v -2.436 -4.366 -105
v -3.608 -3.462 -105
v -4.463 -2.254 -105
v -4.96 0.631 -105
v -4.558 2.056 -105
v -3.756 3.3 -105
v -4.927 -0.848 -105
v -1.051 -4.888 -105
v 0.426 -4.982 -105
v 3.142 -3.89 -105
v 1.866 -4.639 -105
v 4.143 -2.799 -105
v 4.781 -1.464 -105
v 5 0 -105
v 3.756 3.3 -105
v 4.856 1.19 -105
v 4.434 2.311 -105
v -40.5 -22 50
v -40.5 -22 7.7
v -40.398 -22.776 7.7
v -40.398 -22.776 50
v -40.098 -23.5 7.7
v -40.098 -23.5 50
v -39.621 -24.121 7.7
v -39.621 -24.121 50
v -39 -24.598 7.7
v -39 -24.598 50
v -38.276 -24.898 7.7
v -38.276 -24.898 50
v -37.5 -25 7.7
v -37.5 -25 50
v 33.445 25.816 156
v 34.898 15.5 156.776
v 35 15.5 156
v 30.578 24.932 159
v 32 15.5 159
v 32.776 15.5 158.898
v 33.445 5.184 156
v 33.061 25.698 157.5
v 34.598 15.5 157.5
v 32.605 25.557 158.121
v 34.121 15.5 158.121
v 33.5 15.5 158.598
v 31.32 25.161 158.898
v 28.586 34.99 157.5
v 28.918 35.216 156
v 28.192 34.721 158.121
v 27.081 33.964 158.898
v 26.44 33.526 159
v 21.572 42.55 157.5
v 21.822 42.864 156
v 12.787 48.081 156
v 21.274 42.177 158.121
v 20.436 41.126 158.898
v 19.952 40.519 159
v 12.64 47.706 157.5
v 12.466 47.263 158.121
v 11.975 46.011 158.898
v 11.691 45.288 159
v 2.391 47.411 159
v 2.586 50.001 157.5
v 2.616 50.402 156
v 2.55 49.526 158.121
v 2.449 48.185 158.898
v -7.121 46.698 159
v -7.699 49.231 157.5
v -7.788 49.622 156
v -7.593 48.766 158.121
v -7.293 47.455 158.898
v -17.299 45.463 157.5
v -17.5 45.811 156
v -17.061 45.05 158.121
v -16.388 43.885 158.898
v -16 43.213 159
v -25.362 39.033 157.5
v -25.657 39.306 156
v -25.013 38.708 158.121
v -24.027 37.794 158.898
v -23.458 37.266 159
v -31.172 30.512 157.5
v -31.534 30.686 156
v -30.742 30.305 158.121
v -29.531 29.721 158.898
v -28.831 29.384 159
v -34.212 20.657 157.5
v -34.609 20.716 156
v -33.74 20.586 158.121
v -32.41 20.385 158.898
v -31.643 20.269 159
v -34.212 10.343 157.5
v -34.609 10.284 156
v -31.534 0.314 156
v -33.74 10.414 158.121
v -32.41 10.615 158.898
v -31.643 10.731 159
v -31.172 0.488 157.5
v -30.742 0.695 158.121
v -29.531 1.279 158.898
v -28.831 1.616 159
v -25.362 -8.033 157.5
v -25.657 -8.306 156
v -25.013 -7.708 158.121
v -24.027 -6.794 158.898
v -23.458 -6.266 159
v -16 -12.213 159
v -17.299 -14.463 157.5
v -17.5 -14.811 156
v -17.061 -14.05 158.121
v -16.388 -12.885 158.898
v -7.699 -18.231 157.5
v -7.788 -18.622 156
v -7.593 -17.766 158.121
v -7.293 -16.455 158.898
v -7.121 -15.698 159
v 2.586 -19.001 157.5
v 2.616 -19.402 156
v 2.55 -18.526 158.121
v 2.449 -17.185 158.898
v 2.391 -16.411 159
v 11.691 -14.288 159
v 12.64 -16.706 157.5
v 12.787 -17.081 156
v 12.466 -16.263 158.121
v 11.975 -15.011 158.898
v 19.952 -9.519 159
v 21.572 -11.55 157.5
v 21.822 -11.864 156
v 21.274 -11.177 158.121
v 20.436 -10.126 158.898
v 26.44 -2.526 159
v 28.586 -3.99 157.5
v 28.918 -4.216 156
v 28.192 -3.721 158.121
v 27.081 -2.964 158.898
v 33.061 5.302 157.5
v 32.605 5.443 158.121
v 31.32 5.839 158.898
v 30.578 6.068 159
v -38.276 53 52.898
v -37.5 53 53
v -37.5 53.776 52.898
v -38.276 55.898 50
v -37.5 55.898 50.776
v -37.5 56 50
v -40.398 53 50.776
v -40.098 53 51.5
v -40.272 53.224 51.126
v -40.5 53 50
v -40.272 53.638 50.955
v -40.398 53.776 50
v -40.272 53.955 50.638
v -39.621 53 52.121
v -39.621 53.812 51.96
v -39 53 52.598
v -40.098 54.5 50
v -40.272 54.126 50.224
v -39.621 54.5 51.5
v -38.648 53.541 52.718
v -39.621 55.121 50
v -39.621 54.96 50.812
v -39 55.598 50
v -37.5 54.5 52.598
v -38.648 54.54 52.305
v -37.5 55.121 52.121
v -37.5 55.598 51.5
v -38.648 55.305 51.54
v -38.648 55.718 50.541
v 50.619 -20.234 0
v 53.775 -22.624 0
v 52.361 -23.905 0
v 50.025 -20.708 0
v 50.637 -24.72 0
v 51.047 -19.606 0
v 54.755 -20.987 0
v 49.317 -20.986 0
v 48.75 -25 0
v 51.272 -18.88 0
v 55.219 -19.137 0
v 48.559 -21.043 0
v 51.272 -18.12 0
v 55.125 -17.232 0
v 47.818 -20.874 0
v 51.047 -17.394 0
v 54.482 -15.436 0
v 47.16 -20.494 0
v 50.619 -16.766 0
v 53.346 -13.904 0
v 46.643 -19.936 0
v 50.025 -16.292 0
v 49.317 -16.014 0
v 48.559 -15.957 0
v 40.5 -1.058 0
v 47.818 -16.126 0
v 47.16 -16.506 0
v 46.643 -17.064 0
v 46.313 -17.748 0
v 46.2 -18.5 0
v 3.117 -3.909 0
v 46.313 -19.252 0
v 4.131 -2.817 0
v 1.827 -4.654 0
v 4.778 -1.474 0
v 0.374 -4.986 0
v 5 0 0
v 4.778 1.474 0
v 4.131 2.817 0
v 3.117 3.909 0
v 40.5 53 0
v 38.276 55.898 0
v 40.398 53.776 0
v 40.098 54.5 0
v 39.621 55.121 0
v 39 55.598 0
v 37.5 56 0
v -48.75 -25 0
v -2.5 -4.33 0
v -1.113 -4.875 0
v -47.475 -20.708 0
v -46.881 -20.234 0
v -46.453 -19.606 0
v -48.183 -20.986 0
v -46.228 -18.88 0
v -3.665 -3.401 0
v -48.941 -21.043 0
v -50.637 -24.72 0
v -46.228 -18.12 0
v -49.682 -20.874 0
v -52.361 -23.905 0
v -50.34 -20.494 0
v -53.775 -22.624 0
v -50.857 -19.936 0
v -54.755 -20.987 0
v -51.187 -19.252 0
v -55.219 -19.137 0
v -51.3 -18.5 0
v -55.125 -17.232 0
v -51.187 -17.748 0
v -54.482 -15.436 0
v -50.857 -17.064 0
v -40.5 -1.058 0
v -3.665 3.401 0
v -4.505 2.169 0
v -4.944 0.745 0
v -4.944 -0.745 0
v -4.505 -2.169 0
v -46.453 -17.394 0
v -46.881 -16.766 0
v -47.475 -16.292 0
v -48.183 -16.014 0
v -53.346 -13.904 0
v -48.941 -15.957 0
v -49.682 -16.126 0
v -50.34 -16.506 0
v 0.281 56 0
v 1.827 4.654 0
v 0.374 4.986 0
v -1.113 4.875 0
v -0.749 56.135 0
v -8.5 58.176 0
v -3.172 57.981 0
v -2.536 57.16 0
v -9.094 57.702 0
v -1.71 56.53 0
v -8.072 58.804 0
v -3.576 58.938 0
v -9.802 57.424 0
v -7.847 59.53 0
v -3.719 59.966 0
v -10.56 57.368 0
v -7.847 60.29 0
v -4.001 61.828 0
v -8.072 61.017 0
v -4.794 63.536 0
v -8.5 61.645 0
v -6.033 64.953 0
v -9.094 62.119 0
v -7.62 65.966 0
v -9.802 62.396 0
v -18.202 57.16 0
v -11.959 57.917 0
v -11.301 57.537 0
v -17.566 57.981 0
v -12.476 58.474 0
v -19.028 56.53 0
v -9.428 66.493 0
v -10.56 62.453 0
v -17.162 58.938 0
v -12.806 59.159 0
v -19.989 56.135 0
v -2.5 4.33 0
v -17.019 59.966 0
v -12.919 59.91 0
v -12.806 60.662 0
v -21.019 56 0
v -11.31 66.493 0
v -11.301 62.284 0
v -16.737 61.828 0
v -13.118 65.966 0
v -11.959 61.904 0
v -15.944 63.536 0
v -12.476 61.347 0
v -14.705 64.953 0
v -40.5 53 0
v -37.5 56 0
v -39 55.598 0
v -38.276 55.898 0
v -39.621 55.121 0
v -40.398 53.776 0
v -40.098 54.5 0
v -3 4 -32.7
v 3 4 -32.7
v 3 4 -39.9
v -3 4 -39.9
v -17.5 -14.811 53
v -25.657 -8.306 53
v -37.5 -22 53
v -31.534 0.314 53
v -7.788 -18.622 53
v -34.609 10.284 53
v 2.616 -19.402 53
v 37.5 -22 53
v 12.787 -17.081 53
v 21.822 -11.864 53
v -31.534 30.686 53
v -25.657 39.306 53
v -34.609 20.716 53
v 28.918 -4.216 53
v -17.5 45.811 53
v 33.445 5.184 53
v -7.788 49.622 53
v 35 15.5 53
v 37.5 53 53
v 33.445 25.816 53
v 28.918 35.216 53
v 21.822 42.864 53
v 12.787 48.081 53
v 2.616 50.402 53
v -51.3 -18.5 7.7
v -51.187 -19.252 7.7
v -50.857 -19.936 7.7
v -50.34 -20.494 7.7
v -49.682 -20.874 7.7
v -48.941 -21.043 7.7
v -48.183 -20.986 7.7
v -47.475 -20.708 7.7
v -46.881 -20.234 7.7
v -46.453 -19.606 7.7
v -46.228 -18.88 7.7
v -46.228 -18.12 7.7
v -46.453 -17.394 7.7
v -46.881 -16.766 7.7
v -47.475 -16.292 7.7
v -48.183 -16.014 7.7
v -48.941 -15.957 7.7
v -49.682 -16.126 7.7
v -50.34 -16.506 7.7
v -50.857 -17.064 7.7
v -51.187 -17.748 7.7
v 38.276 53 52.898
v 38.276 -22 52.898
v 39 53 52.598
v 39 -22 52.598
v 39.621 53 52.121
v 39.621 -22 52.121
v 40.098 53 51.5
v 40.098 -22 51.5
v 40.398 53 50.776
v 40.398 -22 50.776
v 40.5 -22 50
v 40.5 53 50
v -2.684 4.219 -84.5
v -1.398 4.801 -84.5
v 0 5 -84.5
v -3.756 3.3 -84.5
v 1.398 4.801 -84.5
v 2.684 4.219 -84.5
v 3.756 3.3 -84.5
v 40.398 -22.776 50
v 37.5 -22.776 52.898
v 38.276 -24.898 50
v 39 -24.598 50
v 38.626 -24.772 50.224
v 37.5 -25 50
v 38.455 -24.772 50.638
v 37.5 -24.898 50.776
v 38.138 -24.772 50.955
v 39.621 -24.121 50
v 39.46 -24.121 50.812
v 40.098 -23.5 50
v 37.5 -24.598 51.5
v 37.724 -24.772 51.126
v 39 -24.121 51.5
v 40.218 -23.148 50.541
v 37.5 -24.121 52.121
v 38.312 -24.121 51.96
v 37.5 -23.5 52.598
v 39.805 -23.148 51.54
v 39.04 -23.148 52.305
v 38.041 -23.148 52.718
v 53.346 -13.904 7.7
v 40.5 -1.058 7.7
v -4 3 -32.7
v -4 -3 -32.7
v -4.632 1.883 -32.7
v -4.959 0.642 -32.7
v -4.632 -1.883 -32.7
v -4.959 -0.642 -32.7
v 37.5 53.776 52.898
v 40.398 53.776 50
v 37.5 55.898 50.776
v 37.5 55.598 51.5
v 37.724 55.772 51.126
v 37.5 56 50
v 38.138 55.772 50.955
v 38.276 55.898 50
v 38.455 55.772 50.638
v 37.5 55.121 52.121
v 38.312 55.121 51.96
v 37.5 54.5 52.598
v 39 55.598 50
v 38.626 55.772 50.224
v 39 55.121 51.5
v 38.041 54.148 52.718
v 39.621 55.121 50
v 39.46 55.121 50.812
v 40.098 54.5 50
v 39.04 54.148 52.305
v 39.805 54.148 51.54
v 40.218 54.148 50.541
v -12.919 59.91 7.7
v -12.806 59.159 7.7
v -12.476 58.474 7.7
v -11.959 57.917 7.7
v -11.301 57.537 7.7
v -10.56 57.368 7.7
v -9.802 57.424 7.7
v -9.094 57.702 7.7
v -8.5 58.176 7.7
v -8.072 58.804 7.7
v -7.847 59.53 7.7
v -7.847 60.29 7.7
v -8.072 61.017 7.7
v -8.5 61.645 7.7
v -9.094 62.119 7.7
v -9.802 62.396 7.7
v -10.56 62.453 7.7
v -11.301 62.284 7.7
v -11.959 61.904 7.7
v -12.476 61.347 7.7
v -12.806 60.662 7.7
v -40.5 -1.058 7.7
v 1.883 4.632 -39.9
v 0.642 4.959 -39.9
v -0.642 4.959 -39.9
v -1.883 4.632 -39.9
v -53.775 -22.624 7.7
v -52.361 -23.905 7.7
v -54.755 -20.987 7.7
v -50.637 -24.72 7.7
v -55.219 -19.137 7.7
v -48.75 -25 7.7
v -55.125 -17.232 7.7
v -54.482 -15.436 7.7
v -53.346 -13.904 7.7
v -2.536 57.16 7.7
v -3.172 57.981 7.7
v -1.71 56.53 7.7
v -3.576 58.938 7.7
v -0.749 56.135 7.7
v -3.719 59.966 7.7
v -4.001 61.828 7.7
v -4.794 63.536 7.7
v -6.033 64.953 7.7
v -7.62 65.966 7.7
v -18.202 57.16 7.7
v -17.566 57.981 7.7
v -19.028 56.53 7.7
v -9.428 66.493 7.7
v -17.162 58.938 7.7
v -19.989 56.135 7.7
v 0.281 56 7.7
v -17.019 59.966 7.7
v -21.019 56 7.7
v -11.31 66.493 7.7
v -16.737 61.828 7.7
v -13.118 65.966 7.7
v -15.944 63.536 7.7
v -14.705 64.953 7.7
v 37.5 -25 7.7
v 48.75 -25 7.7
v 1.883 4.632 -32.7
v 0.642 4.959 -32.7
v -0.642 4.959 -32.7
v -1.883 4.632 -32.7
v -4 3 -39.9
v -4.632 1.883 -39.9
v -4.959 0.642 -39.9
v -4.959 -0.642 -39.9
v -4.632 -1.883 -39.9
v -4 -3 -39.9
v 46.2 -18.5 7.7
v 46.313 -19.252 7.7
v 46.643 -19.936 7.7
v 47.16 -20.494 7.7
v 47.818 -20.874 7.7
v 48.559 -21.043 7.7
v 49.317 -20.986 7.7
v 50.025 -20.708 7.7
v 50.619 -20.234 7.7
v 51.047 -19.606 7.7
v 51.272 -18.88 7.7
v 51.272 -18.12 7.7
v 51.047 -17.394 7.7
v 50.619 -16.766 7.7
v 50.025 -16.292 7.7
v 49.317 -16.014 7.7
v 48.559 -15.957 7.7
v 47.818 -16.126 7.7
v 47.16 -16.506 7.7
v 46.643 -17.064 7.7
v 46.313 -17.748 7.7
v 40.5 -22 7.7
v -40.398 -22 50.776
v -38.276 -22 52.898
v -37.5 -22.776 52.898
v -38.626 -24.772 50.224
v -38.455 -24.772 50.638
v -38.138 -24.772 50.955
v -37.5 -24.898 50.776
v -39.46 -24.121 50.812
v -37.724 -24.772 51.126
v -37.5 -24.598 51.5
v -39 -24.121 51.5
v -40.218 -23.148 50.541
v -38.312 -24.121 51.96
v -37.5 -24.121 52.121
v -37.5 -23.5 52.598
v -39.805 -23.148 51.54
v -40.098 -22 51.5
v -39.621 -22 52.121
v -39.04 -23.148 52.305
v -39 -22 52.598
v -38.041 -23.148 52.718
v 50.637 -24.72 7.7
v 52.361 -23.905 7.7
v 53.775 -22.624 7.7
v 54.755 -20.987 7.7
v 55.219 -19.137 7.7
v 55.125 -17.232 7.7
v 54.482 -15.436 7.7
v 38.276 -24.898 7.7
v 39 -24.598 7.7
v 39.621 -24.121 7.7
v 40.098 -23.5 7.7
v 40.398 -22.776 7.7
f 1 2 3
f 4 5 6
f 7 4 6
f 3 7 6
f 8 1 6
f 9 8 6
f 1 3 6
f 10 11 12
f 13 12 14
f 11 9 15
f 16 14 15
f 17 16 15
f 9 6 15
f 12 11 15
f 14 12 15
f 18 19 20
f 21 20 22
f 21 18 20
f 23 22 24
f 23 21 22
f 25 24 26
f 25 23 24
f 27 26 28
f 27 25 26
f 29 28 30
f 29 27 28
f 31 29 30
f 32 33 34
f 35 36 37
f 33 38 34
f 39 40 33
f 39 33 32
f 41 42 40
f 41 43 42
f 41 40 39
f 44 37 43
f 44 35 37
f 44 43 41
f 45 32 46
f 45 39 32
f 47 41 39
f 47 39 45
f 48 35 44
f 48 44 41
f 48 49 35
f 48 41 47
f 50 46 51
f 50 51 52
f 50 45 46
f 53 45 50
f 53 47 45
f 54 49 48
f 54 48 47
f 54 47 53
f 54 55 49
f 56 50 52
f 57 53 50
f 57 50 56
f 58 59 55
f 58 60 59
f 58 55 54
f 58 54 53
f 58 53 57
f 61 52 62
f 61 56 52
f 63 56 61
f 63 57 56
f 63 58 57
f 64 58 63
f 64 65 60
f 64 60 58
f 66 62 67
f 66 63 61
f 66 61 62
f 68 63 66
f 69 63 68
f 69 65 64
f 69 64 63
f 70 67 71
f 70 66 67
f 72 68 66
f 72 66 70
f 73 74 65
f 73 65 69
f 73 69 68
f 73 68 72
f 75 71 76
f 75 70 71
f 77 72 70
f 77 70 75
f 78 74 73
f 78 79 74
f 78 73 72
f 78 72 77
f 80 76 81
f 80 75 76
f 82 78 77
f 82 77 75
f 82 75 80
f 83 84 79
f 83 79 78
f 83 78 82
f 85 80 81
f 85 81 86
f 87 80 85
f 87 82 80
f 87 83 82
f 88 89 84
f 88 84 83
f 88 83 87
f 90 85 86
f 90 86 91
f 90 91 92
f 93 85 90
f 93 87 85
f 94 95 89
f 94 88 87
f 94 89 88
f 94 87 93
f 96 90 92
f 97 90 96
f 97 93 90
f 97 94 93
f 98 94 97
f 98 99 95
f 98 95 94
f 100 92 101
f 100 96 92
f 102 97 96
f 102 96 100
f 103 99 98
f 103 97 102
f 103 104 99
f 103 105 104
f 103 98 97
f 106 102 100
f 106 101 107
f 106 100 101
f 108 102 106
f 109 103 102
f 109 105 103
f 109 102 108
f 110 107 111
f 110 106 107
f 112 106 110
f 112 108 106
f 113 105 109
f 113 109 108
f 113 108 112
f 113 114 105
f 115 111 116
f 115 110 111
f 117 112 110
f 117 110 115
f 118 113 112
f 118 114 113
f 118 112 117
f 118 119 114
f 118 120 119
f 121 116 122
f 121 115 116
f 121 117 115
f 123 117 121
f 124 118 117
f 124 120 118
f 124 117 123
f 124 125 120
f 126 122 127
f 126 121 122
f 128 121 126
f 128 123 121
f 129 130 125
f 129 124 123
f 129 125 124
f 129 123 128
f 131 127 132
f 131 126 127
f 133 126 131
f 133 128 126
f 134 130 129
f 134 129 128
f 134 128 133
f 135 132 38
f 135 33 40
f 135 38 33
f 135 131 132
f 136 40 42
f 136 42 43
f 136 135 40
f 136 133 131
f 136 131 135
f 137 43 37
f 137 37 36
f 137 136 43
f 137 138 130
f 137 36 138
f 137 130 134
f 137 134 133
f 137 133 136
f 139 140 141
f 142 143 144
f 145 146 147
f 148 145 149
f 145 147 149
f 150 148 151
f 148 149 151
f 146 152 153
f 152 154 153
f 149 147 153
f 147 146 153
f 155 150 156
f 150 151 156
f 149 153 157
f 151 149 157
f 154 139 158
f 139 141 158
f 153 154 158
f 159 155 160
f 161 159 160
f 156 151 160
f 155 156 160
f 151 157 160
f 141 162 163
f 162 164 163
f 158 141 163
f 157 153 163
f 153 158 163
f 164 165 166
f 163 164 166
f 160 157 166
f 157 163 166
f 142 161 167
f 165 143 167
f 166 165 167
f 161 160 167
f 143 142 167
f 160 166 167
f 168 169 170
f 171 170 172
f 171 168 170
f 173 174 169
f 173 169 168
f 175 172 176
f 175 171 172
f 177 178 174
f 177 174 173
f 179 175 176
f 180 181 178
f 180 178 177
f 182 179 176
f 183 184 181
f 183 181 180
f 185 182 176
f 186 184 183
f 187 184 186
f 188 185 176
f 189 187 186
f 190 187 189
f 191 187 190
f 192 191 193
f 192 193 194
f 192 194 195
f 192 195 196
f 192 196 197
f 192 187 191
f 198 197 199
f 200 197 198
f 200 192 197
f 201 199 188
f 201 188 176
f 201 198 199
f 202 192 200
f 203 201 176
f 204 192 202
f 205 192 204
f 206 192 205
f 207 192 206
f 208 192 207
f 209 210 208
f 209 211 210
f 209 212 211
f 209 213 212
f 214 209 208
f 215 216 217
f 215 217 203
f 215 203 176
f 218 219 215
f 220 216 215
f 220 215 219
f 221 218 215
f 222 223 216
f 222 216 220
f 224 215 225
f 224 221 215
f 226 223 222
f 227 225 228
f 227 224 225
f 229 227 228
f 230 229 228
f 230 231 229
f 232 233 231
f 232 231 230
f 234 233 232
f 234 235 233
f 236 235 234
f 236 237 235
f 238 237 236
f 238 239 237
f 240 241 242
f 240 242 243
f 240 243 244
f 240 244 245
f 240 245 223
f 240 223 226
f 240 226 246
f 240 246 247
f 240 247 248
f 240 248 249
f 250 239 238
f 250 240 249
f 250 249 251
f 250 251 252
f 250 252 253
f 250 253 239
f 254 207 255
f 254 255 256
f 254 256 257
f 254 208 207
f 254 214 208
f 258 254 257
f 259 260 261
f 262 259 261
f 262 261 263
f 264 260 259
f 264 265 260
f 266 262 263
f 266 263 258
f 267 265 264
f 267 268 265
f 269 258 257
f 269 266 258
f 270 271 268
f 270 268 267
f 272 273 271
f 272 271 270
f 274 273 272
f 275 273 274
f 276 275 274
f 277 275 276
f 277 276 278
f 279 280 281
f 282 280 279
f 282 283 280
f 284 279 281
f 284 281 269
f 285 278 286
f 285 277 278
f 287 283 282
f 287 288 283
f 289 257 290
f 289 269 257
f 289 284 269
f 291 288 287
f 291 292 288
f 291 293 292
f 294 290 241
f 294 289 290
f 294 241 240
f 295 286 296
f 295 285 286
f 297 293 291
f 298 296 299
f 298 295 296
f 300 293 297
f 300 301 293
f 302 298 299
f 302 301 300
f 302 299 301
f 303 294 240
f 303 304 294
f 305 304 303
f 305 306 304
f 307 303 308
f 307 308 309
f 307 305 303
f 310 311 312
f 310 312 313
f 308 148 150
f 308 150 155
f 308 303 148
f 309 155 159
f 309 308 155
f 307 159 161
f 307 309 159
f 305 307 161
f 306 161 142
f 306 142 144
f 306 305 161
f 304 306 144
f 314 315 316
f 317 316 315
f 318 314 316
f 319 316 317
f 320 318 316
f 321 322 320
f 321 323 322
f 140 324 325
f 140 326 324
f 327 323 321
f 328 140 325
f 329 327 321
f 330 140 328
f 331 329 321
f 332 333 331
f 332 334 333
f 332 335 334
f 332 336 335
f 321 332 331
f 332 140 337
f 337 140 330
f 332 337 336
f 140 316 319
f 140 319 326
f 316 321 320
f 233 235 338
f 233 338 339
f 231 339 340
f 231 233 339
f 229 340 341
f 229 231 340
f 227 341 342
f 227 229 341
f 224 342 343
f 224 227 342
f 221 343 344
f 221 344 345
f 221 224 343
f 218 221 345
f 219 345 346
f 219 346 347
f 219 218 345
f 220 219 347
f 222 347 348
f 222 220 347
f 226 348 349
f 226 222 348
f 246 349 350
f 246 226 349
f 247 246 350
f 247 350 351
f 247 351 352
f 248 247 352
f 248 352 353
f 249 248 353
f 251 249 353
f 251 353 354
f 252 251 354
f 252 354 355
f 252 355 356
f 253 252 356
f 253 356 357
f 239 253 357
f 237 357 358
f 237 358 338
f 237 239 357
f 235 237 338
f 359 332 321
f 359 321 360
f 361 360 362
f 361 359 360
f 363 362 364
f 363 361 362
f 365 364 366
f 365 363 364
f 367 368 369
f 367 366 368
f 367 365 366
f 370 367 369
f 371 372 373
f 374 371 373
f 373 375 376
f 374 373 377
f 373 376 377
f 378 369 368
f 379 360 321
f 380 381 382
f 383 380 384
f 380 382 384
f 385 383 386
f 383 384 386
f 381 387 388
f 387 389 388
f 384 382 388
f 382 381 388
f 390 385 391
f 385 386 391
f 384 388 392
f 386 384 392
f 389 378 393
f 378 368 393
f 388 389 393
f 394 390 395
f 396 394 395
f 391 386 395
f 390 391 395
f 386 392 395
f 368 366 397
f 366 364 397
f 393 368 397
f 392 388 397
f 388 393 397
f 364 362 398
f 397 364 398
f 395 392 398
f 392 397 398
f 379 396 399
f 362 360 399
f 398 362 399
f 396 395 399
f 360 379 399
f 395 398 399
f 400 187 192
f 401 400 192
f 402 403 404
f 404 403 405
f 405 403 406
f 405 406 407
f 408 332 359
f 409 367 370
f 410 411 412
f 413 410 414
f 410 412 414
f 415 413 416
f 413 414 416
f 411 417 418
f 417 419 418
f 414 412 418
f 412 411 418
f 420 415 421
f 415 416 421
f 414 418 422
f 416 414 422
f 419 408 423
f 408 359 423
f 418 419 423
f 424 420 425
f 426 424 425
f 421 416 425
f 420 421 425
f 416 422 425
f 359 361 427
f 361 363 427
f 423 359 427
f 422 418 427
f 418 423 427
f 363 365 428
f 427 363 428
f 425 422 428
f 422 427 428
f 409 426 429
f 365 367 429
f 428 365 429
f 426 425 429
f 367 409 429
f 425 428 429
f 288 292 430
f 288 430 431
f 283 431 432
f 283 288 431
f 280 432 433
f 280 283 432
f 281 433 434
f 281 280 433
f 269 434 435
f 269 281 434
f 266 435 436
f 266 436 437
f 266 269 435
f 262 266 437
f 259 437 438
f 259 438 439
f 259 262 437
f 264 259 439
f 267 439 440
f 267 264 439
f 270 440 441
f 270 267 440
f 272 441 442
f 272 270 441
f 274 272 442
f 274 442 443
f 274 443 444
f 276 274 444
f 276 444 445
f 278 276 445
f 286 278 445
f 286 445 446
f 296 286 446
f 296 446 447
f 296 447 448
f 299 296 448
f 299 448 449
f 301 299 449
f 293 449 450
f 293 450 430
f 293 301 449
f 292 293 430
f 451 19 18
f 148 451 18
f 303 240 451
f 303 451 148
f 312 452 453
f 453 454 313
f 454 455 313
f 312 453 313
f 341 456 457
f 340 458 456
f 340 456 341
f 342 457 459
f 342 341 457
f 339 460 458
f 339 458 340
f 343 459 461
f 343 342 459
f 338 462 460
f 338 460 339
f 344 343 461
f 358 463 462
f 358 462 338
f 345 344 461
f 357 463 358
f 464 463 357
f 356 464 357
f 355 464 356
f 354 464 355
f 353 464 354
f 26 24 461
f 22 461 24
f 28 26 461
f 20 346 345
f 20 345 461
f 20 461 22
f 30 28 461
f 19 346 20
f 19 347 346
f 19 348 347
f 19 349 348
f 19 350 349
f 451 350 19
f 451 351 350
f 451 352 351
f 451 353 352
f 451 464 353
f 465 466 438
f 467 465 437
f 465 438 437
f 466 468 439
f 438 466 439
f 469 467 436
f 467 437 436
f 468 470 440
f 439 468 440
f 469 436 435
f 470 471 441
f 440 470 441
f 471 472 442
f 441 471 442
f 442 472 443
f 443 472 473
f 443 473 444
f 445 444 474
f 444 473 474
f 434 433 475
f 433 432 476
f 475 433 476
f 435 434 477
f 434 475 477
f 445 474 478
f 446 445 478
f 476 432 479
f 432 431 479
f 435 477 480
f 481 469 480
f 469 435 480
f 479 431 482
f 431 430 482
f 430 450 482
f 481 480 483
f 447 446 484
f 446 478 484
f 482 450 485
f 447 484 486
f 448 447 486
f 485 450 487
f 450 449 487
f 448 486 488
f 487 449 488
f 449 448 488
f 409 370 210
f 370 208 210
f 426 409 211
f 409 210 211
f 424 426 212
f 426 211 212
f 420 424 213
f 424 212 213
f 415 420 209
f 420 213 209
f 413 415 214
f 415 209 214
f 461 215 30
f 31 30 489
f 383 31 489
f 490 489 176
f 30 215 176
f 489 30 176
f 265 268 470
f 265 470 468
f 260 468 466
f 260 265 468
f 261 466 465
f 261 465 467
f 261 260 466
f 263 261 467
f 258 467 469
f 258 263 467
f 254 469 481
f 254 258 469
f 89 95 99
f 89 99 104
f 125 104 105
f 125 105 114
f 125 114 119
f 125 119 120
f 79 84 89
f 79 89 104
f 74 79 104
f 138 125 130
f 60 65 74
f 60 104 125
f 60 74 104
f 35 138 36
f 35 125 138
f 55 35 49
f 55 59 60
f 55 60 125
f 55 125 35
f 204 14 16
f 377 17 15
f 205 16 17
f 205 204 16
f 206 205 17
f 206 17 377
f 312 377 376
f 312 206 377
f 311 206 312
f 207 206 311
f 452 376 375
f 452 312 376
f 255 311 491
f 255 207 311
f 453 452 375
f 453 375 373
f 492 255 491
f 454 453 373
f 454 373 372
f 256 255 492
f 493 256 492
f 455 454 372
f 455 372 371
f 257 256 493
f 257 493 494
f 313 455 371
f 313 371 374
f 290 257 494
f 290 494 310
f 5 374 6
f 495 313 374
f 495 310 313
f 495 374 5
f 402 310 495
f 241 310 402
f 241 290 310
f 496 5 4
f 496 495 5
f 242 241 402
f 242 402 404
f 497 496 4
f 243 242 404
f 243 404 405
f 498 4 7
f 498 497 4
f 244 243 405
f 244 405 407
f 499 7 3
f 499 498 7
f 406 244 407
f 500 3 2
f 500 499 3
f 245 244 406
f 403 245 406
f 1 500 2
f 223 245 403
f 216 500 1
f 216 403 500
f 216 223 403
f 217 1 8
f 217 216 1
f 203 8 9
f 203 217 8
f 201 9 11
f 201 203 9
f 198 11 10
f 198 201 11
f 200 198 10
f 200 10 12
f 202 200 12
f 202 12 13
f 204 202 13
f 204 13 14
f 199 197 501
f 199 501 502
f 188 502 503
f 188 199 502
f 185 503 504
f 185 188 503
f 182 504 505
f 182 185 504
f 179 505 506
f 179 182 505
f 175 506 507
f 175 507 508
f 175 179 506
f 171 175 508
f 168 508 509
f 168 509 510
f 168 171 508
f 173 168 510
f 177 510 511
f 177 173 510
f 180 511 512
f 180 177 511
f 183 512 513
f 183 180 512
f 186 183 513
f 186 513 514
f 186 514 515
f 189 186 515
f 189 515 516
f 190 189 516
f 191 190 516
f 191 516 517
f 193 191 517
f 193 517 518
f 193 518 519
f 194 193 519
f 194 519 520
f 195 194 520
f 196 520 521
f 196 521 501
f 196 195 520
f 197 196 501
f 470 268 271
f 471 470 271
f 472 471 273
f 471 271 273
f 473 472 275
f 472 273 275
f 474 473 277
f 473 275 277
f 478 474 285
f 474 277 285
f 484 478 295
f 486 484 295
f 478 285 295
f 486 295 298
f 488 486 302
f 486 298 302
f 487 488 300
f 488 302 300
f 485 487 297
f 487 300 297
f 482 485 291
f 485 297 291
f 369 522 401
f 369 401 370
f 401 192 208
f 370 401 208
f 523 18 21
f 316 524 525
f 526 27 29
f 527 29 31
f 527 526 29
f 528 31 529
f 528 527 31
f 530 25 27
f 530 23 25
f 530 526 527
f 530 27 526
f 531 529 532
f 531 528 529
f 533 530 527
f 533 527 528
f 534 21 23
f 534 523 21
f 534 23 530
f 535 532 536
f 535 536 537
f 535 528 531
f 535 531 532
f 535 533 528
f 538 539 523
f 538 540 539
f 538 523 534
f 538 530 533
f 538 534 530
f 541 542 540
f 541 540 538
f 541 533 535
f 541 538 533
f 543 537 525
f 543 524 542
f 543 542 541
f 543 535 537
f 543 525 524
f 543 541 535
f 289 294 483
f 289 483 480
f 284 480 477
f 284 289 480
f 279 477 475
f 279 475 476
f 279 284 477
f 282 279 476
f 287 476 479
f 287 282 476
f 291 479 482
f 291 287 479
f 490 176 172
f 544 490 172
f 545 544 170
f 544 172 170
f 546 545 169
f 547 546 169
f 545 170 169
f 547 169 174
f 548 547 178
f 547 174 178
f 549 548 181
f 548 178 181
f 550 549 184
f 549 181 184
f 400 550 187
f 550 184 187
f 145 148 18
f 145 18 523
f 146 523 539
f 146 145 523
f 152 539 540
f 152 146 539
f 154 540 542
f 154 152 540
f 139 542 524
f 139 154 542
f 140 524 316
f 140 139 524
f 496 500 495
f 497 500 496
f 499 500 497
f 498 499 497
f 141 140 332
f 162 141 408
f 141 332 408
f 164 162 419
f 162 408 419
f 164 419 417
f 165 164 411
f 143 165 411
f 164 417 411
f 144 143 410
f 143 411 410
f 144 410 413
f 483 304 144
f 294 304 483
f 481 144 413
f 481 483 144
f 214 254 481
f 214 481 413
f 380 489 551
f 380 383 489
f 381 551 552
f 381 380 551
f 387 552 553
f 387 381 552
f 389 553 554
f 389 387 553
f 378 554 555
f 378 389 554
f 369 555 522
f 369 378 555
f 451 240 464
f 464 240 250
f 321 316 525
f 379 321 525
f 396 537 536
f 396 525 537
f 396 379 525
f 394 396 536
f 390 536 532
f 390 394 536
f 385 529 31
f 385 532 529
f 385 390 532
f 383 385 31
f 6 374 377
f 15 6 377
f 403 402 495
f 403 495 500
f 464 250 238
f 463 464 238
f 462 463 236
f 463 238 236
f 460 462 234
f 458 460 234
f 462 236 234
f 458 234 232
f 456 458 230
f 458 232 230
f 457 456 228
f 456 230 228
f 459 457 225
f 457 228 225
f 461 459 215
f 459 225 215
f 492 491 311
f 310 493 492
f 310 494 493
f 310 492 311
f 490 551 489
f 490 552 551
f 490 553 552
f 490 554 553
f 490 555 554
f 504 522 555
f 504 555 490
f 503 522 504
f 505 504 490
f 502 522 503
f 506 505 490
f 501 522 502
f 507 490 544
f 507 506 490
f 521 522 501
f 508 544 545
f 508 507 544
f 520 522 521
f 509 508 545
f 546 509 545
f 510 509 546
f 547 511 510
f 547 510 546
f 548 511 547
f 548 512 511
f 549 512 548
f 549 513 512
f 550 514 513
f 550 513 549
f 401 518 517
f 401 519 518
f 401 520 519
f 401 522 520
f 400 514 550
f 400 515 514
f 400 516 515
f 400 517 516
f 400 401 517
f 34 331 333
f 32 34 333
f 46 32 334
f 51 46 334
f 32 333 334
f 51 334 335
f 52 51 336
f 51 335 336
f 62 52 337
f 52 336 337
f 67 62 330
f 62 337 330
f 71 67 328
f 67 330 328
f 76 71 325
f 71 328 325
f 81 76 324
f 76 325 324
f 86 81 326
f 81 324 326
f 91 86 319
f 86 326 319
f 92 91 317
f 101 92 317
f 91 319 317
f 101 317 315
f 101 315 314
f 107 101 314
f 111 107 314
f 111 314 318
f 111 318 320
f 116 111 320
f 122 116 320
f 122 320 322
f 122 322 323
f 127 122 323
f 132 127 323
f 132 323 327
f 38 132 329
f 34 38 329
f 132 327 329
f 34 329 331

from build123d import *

# Parameters (mm, degrees)
SKETCH1_W           = 81
SKETCH1_H           = 81
BOSS_EXTRUDE1_DEPTH = 53
SKETCH2_R           = 35
BOSS_EXTRUDE2_DEPTH = 106
SKETCH3_R           = 5
BOSS_EXTRUDE3_DEPTH = 105
SKETCH4_R           = 2.55
BOSS_EXTRUDE4_DEPTH = 7.7
FILLET1_R           = 4
FILLET2_R           = 3
CUT_EXTRUDE1_START  = -84.5
SKETCH5_W           = 18.690524158
SKETCH5_H           = 8.031084599
CUT_EXTRUDE1_DEPTH  = 30
CUT_EXTRUDE2_START  = -32.7
CUT_EXTRUDE2_DEPTH  = 7.2


with BuildPart() as part:
    # Sketch1 → Boss-Extrude1 (new body)
    with BuildSketch(Plane.XY):
        with Locations((0, 15.5)):
            Rectangle(SKETCH1_W, SKETCH1_H)
    extrude(amount=BOSS_EXTRUDE1_DEPTH)

    # Sketch2 → Boss-Extrude2 (add)
    with BuildSketch(Plane.XY.offset(53)):
        with Locations((0, 15.5)):
            Circle(SKETCH2_R)
    extrude(amount=BOSS_EXTRUDE2_DEPTH)

    # Sketch3 → Boss-Extrude3 (add)
    with BuildSketch(Plane.XY):
        Circle(SKETCH3_R)
    extrude(amount=-BOSS_EXTRUDE3_DEPTH)

    # Sketch4 → Boss-Extrude4 (add)
    with BuildSketch(Plane.XY):
        with BuildLine():
            Line((-48.75, -25), (48.75, -25))
            ThreePointArc((48.75, -25), (54.755216961, -20.98744231), (53.346194078, -13.903805922))
            Line((53.346194078, -13.903805922), (40.5, -1.057611845))
            Line((40.5, -1.057611845), (40.5, 56))
            Line((40.5, 56), (-3.718974359, 56))
            Line((-3.718974359, 56), (-3.718974359, 59.910374765))
            ThreePointArc((-3.718974359, 59.910374765), (-10.368974359, 66.560374765), (-17.018974359, 59.910374765))
            Line((-17.018974359, 59.910374765), (-17.018974359, 56))
            Line((-17.018974359, 56), (-40.5, 56))
            Line((-40.5, 56), (-40.5, -1.057611845))
            Line((-40.5, -1.057611845), (-53.346194078, -13.903805922))
            ThreePointArc((-53.346194078, -13.903805922), (-54.755216961, -20.98744231), (-48.75, -25))
        make_face()
        with Locations(Location((-48.75, -18.5, 0), (0, 0, 180))):
            Circle(SKETCH4_R, mode=Mode.SUBTRACT)
        with Locations(Location((48.75, -18.5, 0), (0, 0, 180))):
            Circle(SKETCH4_R, mode=Mode.SUBTRACT)
        with Locations(Location((-10.368974359, 59.910374765, 0), (0, 0, 180))):
            Circle(SKETCH4_R, mode=Mode.SUBTRACT)
    extrude(amount=BOSS_EXTRUDE4_DEPTH)

    # Fillet1
    # the kernel refuses this fillet: 4 mm, written as the material it adds along each edge
    with BuildSketch(Plane(origin=(-17.018974359, 56, 0), x_dir=(-1, 0, 0), z_dir=(0, 0, 1))) as fillet1_piece_1:
        with BuildLine():
            CenterArc((3.999622872, -4), FILLET1_R, 90, 89.517820814)
            Line((-0.000235484, -3.96633794), (-0.400221319, -3.962971734))
            ThreePointArc((-0.400221319, -3.962971734), (-0.4, -3.910374765), (-0.4, 0))
            Line((-0.4, 0), (0, 0.4))
            Line((0, 0.4), (3.999622872, 0.4))
            Line((3.999622872, 0.4), (3.999622872, 0))
        make_face()
    extrude(amount=7.7)
    with BuildSketch(Plane(origin=(-3.718974359, 56, 0), x_dir=(1, 0, 0), z_dir=(0, 0, 1))) as fillet1_piece_2:
        with BuildLine():
            CenterArc((3.999622872, 4), FILLET1_R, 180.482179186, 89.517820814)
            Line((-0.000235484, 3.96633794), (-0.400221319, 3.962971734))
            ThreePointArc((-0.400221319, 3.962971734), (-0.4, 3.910374765), (-0.4, 0))
            Line((-0.4, 0), (0, -0.4))
            Line((0, -0.4), (3.999622872, -0.4))
            Line((3.999622872, -0.4), (3.999622872, 0))
        make_face()
    extrude(amount=7.7)

    # Fillet2
    fillet2_edges = [part.edges().sort_by_distance(p)[0] for p in [
        (40.5, 15.5, 53),
        (-35, 15.5, 159),
        (0, 56, 53),
        (-40.5, 15.5, 53),
        (-40.5, 56, 26.5),
        (40.5, 56, 26.5),
        (40.5, -25, 30.35),
        (-40.5, -25, 30.35),
        (0, -25, 53),
    ]]
    fillet(fillet2_edges, radius=FILLET2_R)

    # Sketch5 → Cut-Extrude1 (cut)
    with BuildSketch(Plane.XY.offset(CUT_EXTRUDE1_START)):
        with Locations((0.303510312, 7.3155423)):
            Rectangle(SKETCH5_W, SKETCH5_H)
    extrude(amount=-CUT_EXTRUDE1_DEPTH, mode=Mode.SUBTRACT)

    # Sketch6 → Cut-Extrude2 (cut)
    with BuildSketch(Plane.XY.offset(CUT_EXTRUDE2_START)):
        Polygon((8.240833127, 7.650995437), (8.240833127, 4), (-4, 4), (-4, -6.044194101), (-7.393498293, -6.044194101), (-7.393498293, 7.650995437), align=None)
    extrude(amount=-CUT_EXTRUDE2_DEPTH, mode=Mode.SUBTRACT)


solid = part.part
